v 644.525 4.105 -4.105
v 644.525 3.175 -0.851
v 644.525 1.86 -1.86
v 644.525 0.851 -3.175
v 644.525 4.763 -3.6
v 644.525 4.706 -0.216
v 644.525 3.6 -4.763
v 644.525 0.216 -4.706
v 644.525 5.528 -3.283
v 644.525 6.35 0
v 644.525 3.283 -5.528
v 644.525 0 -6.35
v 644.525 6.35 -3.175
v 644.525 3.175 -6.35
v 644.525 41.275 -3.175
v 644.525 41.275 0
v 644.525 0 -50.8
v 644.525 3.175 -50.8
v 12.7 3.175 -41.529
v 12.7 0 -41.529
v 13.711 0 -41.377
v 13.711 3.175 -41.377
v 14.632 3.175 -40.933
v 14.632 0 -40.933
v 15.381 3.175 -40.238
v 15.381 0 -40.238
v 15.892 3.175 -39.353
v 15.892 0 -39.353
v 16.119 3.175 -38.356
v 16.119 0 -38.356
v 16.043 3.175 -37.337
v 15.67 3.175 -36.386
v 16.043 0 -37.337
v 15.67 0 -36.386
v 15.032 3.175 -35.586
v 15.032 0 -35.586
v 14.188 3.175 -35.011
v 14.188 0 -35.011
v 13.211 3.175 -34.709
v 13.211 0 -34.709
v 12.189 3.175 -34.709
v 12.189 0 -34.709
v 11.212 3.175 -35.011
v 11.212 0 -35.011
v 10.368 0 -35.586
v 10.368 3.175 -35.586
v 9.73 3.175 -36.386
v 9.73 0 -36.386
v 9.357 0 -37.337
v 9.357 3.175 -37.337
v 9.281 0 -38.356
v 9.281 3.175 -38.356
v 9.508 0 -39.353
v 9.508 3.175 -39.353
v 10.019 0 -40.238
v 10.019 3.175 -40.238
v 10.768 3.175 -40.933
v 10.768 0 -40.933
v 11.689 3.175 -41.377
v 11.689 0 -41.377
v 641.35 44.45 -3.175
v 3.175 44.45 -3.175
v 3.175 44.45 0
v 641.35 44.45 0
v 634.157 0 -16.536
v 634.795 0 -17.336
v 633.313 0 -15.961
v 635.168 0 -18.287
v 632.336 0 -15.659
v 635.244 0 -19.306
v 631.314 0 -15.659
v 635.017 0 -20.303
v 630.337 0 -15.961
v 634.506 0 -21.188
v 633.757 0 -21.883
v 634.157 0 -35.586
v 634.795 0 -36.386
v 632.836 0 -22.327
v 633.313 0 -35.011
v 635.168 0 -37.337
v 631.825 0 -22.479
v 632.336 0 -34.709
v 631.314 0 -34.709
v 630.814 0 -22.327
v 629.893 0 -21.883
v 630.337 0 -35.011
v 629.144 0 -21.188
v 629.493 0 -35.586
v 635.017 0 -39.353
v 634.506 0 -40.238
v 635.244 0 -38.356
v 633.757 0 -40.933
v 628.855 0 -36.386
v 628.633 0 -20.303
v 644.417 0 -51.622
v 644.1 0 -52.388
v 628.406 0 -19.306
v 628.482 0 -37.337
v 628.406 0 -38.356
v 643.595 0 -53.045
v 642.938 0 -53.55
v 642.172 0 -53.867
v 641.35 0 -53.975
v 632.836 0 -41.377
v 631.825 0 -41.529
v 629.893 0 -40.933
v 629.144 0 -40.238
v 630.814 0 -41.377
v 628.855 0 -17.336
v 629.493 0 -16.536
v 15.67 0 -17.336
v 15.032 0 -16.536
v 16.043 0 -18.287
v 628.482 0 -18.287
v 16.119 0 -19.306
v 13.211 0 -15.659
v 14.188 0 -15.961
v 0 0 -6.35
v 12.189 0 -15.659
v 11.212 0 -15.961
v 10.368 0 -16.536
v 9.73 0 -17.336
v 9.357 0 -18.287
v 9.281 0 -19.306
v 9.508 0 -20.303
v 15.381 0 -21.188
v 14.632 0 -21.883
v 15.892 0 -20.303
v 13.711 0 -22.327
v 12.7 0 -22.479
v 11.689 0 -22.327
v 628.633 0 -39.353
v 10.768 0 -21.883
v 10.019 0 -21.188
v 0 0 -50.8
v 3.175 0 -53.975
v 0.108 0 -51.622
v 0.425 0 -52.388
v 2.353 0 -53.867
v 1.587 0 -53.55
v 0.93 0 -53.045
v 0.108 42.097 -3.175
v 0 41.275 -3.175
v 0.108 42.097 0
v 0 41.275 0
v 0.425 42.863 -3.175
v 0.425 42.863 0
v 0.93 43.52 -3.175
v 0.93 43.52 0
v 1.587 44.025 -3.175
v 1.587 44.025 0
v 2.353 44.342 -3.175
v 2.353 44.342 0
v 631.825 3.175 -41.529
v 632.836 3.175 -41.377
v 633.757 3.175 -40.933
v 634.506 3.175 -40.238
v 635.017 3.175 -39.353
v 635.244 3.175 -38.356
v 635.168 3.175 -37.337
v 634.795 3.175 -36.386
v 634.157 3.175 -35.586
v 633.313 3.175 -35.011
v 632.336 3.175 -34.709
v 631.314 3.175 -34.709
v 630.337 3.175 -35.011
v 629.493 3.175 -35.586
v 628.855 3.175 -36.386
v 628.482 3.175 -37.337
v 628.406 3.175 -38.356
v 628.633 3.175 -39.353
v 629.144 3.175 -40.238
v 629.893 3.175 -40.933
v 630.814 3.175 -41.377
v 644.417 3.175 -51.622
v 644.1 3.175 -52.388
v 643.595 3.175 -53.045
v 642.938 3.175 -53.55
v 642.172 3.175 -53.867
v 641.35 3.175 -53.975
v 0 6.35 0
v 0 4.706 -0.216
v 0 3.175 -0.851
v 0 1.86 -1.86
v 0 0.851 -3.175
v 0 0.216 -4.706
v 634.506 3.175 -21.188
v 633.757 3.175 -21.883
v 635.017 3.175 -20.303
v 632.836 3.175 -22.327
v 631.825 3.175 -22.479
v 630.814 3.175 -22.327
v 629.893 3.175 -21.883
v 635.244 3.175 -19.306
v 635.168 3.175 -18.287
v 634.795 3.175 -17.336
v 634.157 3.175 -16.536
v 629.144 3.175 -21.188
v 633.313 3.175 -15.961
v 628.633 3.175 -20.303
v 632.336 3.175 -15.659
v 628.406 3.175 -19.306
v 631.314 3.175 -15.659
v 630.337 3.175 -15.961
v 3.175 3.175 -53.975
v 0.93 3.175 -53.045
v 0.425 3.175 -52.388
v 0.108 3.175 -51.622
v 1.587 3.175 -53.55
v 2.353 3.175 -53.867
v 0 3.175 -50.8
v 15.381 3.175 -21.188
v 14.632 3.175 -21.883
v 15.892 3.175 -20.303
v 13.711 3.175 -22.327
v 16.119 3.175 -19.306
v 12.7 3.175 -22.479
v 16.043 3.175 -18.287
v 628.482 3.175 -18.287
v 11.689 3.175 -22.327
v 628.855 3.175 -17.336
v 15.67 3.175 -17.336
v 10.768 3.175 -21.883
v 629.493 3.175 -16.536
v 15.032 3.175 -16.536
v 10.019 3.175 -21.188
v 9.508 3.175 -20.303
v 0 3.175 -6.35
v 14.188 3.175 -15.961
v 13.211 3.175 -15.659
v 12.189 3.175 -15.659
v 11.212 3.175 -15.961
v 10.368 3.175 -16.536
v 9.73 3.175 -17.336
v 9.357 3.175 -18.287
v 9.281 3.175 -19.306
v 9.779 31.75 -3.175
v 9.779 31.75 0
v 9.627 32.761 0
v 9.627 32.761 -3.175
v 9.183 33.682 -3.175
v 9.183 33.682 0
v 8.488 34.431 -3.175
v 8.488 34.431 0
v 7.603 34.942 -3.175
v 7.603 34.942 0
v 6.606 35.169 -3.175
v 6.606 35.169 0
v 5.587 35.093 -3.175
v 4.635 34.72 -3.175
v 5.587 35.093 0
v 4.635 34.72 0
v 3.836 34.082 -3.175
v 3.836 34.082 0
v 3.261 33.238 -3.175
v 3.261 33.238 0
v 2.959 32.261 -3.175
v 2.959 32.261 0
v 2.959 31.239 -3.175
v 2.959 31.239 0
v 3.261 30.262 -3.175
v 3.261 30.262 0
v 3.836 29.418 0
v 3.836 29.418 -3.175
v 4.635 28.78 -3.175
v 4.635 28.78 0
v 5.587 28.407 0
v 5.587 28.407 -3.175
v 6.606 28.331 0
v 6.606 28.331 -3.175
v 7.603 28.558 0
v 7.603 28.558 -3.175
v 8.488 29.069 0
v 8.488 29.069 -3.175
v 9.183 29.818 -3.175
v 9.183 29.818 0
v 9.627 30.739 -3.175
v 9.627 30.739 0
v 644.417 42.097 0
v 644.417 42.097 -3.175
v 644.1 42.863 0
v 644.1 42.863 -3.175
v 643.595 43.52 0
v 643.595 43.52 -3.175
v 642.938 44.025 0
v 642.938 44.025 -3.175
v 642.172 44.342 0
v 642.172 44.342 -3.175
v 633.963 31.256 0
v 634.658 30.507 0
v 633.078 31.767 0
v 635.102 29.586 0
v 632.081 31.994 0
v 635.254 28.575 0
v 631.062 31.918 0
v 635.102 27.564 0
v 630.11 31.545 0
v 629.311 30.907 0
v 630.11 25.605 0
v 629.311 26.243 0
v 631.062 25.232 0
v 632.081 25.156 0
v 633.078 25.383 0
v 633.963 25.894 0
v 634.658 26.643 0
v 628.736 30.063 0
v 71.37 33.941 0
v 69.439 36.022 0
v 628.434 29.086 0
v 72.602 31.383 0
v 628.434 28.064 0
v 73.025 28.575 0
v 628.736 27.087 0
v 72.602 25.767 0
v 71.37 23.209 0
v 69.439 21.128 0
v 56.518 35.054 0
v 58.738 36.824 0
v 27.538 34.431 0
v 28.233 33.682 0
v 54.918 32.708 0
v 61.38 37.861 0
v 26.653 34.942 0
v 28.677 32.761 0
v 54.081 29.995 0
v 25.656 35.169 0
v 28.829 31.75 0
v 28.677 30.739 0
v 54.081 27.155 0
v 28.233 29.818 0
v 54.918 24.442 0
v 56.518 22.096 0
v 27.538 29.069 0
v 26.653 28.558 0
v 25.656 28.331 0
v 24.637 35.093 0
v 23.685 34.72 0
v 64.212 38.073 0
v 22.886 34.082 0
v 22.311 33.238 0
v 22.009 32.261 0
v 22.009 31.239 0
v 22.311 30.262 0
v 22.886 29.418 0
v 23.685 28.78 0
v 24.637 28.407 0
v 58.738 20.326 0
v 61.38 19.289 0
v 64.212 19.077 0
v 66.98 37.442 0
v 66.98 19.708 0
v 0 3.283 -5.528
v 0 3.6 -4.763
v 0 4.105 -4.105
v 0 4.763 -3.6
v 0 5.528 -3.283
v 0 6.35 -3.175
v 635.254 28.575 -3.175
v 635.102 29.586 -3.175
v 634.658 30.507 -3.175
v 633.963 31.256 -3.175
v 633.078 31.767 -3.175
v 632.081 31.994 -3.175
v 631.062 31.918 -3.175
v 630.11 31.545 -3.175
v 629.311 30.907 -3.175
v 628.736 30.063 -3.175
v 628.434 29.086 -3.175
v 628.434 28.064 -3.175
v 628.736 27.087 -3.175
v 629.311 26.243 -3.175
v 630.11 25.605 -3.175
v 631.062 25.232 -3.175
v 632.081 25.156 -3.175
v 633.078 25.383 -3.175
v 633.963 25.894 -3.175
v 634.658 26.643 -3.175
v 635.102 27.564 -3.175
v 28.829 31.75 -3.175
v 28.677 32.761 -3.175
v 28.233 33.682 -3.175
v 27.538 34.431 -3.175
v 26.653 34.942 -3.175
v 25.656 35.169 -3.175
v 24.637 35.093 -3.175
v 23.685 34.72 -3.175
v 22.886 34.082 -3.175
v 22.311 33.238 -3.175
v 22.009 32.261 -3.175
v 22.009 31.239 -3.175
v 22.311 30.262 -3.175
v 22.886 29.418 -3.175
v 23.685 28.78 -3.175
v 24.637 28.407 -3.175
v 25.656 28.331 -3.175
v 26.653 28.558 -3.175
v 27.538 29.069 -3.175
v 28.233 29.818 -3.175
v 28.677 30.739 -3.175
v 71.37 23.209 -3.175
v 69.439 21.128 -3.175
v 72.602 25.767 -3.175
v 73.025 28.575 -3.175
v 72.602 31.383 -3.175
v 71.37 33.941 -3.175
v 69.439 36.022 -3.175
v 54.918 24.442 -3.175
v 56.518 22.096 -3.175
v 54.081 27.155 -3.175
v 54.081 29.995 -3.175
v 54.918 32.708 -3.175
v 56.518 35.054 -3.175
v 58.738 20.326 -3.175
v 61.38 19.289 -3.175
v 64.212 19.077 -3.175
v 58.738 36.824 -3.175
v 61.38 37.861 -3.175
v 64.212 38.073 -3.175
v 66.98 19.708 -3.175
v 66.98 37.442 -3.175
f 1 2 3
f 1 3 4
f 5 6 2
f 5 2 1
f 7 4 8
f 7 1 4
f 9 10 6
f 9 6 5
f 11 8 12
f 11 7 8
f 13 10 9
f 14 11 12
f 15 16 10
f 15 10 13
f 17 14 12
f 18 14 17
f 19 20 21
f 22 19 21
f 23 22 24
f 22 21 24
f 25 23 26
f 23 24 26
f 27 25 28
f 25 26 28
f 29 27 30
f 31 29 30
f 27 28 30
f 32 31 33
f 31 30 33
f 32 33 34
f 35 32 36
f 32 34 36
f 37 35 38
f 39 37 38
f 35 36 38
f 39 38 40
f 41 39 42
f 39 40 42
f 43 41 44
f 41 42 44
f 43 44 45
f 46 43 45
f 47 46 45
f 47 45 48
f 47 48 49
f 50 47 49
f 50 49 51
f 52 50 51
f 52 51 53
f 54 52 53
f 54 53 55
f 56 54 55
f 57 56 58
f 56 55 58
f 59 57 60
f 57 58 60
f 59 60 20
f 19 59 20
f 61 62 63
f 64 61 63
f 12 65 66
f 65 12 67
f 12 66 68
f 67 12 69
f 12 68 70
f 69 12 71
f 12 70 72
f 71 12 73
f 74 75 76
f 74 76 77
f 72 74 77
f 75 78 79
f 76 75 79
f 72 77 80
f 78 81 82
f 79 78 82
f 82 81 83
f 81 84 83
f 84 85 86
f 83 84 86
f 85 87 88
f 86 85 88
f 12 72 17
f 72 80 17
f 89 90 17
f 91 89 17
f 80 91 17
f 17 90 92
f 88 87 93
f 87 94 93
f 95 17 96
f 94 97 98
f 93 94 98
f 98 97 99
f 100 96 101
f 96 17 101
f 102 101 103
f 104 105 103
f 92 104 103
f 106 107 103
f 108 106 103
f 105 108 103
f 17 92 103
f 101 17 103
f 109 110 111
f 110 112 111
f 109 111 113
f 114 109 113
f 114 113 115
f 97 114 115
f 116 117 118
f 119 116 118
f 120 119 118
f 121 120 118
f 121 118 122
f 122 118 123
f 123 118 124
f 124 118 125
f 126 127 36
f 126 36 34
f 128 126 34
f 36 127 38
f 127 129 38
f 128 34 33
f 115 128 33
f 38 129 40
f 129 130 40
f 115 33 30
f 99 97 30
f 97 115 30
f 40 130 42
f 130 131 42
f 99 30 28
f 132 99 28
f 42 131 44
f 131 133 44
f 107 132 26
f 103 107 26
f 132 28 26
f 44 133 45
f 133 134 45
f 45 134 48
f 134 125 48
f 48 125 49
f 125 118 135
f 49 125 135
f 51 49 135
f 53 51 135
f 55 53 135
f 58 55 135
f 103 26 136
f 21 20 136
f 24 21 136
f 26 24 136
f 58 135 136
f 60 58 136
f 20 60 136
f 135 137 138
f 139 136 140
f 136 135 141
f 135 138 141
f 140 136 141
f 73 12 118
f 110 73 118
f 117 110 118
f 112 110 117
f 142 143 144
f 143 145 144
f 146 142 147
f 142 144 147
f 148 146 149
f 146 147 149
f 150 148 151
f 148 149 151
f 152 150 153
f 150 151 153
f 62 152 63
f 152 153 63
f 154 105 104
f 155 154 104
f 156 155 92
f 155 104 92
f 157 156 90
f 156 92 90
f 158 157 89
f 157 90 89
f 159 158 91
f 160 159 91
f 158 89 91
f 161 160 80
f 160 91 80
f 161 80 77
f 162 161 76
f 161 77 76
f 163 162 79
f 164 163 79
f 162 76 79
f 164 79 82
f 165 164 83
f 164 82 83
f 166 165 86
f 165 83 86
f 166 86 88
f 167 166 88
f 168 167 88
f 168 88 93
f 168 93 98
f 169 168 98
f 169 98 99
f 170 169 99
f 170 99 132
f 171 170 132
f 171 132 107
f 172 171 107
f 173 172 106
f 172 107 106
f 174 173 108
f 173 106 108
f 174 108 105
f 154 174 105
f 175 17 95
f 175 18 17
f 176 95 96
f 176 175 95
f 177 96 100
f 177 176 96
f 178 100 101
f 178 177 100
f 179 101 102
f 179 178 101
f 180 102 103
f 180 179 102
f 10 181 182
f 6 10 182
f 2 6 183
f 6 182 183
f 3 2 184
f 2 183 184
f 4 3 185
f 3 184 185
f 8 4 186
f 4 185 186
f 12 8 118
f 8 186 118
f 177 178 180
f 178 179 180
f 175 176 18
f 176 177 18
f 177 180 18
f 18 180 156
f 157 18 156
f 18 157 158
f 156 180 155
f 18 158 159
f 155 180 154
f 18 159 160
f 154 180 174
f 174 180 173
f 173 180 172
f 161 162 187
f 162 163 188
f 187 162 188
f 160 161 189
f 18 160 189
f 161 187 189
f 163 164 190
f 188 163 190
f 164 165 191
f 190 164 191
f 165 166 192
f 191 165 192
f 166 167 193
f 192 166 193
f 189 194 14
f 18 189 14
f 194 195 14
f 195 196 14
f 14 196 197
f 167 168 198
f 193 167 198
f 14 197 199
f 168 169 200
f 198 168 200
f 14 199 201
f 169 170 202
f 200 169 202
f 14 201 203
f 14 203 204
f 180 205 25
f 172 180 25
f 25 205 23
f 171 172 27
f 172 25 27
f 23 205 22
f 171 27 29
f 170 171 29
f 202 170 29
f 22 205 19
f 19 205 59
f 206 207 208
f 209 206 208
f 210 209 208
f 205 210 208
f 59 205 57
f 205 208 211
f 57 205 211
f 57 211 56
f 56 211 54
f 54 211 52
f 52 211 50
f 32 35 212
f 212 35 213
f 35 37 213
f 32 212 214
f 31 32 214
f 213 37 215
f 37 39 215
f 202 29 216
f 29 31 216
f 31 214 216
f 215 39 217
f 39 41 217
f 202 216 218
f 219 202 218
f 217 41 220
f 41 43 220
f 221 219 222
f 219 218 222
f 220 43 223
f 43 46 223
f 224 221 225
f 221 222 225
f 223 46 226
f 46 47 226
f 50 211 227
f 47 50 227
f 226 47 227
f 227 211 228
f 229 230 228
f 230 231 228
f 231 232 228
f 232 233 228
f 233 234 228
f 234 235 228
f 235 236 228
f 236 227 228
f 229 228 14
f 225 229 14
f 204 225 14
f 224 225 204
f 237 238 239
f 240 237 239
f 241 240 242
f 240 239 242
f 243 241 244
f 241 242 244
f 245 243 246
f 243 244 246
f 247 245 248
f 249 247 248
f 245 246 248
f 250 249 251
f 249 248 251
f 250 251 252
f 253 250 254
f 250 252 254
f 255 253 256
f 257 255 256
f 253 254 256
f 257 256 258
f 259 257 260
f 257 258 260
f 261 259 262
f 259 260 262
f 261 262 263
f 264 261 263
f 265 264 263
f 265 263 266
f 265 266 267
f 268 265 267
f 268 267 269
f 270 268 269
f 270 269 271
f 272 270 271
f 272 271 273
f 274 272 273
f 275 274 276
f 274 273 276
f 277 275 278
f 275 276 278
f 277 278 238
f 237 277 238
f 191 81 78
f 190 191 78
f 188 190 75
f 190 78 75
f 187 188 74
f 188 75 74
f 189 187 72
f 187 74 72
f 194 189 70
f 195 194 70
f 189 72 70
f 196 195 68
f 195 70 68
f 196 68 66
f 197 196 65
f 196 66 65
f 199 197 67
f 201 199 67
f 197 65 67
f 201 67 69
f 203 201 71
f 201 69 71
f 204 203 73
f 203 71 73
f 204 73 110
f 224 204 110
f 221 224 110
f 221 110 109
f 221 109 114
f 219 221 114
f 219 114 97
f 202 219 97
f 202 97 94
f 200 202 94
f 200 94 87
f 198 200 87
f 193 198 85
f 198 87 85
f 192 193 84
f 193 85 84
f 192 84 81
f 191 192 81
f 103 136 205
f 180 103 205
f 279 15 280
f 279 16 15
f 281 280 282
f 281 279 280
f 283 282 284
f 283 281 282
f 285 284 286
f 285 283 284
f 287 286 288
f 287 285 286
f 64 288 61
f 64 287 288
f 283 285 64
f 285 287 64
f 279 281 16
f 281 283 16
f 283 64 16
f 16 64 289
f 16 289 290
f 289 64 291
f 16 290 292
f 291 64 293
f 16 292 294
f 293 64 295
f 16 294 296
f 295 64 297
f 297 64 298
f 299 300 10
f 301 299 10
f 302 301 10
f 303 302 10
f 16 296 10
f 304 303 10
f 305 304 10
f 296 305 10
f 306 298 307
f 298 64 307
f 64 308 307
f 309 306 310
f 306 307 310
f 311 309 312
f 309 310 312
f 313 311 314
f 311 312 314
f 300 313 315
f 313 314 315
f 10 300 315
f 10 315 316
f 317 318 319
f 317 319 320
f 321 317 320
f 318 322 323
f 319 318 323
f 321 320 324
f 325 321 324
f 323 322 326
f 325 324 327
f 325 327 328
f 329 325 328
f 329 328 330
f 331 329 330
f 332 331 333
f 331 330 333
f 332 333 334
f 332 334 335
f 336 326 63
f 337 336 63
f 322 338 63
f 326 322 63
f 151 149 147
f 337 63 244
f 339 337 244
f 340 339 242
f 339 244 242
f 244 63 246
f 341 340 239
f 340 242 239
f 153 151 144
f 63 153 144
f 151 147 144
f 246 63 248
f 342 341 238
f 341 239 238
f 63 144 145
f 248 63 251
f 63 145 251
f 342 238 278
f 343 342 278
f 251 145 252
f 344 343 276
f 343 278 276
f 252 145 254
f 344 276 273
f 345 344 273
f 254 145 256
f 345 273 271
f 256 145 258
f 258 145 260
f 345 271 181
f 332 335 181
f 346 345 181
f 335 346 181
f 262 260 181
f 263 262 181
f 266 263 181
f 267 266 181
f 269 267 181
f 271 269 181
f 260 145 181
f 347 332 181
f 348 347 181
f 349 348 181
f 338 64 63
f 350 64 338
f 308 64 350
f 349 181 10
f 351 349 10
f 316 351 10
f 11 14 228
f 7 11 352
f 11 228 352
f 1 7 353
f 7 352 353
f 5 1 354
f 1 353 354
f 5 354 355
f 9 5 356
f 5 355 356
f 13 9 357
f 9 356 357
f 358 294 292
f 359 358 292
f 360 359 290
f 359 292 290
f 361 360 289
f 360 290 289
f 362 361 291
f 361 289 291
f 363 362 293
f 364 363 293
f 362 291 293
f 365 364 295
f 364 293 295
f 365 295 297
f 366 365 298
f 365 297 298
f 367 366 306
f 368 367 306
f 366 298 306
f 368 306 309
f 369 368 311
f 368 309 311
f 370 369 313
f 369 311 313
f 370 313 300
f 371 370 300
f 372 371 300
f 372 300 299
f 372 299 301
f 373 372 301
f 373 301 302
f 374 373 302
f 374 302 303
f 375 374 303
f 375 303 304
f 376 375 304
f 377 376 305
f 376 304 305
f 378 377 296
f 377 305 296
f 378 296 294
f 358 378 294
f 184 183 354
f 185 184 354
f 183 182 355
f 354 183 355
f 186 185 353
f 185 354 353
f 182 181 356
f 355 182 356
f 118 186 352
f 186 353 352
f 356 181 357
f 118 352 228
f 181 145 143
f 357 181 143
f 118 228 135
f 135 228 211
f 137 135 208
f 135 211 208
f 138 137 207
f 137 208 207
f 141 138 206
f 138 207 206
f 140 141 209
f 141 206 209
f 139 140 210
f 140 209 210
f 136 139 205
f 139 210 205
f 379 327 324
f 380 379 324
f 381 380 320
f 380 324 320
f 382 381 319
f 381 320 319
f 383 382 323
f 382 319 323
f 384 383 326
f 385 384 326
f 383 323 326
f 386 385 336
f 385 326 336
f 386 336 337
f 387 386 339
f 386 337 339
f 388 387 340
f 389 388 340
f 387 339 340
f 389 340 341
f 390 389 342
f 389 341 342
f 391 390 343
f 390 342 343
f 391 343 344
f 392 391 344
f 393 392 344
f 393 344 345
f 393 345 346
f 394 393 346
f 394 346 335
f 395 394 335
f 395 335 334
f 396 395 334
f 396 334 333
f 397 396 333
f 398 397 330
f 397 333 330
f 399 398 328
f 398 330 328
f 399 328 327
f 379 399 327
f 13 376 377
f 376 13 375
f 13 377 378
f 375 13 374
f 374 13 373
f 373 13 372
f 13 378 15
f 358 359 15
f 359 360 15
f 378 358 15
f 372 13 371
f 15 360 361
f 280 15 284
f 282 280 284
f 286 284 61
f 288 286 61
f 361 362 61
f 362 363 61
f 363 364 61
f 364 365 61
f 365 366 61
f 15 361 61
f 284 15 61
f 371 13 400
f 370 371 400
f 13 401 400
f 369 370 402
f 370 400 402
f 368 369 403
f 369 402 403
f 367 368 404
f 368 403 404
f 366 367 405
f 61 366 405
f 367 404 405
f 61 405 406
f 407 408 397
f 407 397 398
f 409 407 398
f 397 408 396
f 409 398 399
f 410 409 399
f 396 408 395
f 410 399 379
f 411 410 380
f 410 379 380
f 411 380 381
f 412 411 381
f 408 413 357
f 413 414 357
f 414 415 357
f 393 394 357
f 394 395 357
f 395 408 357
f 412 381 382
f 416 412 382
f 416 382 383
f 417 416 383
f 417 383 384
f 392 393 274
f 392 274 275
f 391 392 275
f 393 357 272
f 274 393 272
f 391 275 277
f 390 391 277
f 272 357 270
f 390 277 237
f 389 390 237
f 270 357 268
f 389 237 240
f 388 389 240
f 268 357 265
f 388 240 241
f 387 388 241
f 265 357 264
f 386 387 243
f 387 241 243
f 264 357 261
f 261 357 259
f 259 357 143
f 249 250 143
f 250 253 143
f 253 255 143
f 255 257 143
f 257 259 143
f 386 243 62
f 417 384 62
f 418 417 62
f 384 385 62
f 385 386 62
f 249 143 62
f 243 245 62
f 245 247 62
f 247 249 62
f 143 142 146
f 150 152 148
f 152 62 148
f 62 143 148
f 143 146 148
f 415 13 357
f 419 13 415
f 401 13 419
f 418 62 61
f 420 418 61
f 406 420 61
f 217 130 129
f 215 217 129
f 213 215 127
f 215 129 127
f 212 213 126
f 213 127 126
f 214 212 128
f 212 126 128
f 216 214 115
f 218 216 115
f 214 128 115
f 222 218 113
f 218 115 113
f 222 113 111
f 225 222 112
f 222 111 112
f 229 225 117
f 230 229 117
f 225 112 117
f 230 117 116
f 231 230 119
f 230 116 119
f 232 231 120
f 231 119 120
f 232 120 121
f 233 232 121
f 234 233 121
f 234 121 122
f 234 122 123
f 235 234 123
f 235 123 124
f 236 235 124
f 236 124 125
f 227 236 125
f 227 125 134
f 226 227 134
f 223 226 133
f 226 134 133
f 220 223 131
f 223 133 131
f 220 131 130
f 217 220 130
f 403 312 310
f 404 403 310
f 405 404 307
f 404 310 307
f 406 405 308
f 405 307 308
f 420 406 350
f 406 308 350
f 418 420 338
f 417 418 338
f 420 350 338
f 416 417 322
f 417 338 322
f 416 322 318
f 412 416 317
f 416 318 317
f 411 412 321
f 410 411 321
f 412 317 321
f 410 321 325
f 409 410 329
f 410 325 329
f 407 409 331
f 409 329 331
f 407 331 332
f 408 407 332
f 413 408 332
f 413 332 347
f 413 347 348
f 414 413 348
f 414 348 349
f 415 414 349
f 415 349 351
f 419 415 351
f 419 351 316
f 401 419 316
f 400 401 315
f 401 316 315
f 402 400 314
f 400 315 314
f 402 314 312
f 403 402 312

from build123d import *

# Parameters (mm, degrees)
BASE_FLANGE1_DEPTH = 644.525
SKETCH3_R          = 3.429
CUT_EXTRUDE1_DEPTH = 3.175
SKETCH5_R          = 3.429
SKETCH5_R_2        = 9.525
CUT_EXTRUDE2_DEPTH = 3.175
FILLET1_R          = 3.175


# Read off the part's stored shape, not the designer's step: Base-Flange1
with BuildPart() as part:
    # Base-Flange1 outline → Base-Flange1 (new body)
    with BuildSketch(Plane(origin=(0, 0, 0), x_dir=(0, 0, -1), z_dir=(1, 0, 0))):
        with BuildLine():
            Line((3.175, 6.35), (3.175, 44.45))
            Line((3.175, 44.45), (0, 44.45))
            Line((0, 44.45), (0, 6.35))
            ThreePointArc((0, 6.35), (1.859871939, 1.859871939), (6.35, 0))
            Line((6.35, 0), (53.975, 0))
            Line((53.975, 0), (53.975, 3.175))
            Line((53.975, 3.175), (6.35, 3.175))
            ThreePointArc((6.35, 3.175), (4.10493597, 4.10493597), (3.175, 6.35))
        make_face()
    extrude(amount=BASE_FLANGE1_DEPTH)

    # Sketch3 → Cut-Extrude1 (cut)
    with BuildSketch(Plane.XZ):
        with Locations(Location((631.825, -19.05, 0), (0, 0, 270))):
            Circle(SKETCH3_R)
        with Locations(Location((631.825, -38.1, 0), (0, 0, 270))):
            Circle(SKETCH3_R)
        with Locations(Location((12.7, -38.1, 0), (0, 0, 270))):
            Circle(SKETCH3_R)
        with Locations(Location((12.7, -19.05, 0), (0, 0, 270))):
            Circle(SKETCH3_R)
    extrude(amount=-CUT_EXTRUDE1_DEPTH, mode=Mode.SUBTRACT)

    # Sketch5 → Cut-Extrude2 (cut)
    with BuildSketch(Plane.XY):
        with Locations((631.825, 28.575)):
            Circle(SKETCH5_R)
        with Locations((6.35, 31.75)):
            Circle(SKETCH5_R)
        with Locations((63.5, 28.575)):
            Circle(SKETCH5_R_2)
        with Locations((25.4, 31.75)):
            Circle(SKETCH5_R)
    extrude(amount=-CUT_EXTRUDE2_DEPTH, mode=Mode.SUBTRACT)

    # Fillet1
    fillet1_edges = [part.edges().sort_by_distance(p)[0] for p in [
        (644.525, 1.5875, -53.975),
        (0, 1.5875, -53.975),
        (644.525, 44.45, -1.5875),
        (0, 44.45, -1.5875),
    ]]
    fillet(fillet1_edges, radius=FILLET1_R)


solid = part.part
